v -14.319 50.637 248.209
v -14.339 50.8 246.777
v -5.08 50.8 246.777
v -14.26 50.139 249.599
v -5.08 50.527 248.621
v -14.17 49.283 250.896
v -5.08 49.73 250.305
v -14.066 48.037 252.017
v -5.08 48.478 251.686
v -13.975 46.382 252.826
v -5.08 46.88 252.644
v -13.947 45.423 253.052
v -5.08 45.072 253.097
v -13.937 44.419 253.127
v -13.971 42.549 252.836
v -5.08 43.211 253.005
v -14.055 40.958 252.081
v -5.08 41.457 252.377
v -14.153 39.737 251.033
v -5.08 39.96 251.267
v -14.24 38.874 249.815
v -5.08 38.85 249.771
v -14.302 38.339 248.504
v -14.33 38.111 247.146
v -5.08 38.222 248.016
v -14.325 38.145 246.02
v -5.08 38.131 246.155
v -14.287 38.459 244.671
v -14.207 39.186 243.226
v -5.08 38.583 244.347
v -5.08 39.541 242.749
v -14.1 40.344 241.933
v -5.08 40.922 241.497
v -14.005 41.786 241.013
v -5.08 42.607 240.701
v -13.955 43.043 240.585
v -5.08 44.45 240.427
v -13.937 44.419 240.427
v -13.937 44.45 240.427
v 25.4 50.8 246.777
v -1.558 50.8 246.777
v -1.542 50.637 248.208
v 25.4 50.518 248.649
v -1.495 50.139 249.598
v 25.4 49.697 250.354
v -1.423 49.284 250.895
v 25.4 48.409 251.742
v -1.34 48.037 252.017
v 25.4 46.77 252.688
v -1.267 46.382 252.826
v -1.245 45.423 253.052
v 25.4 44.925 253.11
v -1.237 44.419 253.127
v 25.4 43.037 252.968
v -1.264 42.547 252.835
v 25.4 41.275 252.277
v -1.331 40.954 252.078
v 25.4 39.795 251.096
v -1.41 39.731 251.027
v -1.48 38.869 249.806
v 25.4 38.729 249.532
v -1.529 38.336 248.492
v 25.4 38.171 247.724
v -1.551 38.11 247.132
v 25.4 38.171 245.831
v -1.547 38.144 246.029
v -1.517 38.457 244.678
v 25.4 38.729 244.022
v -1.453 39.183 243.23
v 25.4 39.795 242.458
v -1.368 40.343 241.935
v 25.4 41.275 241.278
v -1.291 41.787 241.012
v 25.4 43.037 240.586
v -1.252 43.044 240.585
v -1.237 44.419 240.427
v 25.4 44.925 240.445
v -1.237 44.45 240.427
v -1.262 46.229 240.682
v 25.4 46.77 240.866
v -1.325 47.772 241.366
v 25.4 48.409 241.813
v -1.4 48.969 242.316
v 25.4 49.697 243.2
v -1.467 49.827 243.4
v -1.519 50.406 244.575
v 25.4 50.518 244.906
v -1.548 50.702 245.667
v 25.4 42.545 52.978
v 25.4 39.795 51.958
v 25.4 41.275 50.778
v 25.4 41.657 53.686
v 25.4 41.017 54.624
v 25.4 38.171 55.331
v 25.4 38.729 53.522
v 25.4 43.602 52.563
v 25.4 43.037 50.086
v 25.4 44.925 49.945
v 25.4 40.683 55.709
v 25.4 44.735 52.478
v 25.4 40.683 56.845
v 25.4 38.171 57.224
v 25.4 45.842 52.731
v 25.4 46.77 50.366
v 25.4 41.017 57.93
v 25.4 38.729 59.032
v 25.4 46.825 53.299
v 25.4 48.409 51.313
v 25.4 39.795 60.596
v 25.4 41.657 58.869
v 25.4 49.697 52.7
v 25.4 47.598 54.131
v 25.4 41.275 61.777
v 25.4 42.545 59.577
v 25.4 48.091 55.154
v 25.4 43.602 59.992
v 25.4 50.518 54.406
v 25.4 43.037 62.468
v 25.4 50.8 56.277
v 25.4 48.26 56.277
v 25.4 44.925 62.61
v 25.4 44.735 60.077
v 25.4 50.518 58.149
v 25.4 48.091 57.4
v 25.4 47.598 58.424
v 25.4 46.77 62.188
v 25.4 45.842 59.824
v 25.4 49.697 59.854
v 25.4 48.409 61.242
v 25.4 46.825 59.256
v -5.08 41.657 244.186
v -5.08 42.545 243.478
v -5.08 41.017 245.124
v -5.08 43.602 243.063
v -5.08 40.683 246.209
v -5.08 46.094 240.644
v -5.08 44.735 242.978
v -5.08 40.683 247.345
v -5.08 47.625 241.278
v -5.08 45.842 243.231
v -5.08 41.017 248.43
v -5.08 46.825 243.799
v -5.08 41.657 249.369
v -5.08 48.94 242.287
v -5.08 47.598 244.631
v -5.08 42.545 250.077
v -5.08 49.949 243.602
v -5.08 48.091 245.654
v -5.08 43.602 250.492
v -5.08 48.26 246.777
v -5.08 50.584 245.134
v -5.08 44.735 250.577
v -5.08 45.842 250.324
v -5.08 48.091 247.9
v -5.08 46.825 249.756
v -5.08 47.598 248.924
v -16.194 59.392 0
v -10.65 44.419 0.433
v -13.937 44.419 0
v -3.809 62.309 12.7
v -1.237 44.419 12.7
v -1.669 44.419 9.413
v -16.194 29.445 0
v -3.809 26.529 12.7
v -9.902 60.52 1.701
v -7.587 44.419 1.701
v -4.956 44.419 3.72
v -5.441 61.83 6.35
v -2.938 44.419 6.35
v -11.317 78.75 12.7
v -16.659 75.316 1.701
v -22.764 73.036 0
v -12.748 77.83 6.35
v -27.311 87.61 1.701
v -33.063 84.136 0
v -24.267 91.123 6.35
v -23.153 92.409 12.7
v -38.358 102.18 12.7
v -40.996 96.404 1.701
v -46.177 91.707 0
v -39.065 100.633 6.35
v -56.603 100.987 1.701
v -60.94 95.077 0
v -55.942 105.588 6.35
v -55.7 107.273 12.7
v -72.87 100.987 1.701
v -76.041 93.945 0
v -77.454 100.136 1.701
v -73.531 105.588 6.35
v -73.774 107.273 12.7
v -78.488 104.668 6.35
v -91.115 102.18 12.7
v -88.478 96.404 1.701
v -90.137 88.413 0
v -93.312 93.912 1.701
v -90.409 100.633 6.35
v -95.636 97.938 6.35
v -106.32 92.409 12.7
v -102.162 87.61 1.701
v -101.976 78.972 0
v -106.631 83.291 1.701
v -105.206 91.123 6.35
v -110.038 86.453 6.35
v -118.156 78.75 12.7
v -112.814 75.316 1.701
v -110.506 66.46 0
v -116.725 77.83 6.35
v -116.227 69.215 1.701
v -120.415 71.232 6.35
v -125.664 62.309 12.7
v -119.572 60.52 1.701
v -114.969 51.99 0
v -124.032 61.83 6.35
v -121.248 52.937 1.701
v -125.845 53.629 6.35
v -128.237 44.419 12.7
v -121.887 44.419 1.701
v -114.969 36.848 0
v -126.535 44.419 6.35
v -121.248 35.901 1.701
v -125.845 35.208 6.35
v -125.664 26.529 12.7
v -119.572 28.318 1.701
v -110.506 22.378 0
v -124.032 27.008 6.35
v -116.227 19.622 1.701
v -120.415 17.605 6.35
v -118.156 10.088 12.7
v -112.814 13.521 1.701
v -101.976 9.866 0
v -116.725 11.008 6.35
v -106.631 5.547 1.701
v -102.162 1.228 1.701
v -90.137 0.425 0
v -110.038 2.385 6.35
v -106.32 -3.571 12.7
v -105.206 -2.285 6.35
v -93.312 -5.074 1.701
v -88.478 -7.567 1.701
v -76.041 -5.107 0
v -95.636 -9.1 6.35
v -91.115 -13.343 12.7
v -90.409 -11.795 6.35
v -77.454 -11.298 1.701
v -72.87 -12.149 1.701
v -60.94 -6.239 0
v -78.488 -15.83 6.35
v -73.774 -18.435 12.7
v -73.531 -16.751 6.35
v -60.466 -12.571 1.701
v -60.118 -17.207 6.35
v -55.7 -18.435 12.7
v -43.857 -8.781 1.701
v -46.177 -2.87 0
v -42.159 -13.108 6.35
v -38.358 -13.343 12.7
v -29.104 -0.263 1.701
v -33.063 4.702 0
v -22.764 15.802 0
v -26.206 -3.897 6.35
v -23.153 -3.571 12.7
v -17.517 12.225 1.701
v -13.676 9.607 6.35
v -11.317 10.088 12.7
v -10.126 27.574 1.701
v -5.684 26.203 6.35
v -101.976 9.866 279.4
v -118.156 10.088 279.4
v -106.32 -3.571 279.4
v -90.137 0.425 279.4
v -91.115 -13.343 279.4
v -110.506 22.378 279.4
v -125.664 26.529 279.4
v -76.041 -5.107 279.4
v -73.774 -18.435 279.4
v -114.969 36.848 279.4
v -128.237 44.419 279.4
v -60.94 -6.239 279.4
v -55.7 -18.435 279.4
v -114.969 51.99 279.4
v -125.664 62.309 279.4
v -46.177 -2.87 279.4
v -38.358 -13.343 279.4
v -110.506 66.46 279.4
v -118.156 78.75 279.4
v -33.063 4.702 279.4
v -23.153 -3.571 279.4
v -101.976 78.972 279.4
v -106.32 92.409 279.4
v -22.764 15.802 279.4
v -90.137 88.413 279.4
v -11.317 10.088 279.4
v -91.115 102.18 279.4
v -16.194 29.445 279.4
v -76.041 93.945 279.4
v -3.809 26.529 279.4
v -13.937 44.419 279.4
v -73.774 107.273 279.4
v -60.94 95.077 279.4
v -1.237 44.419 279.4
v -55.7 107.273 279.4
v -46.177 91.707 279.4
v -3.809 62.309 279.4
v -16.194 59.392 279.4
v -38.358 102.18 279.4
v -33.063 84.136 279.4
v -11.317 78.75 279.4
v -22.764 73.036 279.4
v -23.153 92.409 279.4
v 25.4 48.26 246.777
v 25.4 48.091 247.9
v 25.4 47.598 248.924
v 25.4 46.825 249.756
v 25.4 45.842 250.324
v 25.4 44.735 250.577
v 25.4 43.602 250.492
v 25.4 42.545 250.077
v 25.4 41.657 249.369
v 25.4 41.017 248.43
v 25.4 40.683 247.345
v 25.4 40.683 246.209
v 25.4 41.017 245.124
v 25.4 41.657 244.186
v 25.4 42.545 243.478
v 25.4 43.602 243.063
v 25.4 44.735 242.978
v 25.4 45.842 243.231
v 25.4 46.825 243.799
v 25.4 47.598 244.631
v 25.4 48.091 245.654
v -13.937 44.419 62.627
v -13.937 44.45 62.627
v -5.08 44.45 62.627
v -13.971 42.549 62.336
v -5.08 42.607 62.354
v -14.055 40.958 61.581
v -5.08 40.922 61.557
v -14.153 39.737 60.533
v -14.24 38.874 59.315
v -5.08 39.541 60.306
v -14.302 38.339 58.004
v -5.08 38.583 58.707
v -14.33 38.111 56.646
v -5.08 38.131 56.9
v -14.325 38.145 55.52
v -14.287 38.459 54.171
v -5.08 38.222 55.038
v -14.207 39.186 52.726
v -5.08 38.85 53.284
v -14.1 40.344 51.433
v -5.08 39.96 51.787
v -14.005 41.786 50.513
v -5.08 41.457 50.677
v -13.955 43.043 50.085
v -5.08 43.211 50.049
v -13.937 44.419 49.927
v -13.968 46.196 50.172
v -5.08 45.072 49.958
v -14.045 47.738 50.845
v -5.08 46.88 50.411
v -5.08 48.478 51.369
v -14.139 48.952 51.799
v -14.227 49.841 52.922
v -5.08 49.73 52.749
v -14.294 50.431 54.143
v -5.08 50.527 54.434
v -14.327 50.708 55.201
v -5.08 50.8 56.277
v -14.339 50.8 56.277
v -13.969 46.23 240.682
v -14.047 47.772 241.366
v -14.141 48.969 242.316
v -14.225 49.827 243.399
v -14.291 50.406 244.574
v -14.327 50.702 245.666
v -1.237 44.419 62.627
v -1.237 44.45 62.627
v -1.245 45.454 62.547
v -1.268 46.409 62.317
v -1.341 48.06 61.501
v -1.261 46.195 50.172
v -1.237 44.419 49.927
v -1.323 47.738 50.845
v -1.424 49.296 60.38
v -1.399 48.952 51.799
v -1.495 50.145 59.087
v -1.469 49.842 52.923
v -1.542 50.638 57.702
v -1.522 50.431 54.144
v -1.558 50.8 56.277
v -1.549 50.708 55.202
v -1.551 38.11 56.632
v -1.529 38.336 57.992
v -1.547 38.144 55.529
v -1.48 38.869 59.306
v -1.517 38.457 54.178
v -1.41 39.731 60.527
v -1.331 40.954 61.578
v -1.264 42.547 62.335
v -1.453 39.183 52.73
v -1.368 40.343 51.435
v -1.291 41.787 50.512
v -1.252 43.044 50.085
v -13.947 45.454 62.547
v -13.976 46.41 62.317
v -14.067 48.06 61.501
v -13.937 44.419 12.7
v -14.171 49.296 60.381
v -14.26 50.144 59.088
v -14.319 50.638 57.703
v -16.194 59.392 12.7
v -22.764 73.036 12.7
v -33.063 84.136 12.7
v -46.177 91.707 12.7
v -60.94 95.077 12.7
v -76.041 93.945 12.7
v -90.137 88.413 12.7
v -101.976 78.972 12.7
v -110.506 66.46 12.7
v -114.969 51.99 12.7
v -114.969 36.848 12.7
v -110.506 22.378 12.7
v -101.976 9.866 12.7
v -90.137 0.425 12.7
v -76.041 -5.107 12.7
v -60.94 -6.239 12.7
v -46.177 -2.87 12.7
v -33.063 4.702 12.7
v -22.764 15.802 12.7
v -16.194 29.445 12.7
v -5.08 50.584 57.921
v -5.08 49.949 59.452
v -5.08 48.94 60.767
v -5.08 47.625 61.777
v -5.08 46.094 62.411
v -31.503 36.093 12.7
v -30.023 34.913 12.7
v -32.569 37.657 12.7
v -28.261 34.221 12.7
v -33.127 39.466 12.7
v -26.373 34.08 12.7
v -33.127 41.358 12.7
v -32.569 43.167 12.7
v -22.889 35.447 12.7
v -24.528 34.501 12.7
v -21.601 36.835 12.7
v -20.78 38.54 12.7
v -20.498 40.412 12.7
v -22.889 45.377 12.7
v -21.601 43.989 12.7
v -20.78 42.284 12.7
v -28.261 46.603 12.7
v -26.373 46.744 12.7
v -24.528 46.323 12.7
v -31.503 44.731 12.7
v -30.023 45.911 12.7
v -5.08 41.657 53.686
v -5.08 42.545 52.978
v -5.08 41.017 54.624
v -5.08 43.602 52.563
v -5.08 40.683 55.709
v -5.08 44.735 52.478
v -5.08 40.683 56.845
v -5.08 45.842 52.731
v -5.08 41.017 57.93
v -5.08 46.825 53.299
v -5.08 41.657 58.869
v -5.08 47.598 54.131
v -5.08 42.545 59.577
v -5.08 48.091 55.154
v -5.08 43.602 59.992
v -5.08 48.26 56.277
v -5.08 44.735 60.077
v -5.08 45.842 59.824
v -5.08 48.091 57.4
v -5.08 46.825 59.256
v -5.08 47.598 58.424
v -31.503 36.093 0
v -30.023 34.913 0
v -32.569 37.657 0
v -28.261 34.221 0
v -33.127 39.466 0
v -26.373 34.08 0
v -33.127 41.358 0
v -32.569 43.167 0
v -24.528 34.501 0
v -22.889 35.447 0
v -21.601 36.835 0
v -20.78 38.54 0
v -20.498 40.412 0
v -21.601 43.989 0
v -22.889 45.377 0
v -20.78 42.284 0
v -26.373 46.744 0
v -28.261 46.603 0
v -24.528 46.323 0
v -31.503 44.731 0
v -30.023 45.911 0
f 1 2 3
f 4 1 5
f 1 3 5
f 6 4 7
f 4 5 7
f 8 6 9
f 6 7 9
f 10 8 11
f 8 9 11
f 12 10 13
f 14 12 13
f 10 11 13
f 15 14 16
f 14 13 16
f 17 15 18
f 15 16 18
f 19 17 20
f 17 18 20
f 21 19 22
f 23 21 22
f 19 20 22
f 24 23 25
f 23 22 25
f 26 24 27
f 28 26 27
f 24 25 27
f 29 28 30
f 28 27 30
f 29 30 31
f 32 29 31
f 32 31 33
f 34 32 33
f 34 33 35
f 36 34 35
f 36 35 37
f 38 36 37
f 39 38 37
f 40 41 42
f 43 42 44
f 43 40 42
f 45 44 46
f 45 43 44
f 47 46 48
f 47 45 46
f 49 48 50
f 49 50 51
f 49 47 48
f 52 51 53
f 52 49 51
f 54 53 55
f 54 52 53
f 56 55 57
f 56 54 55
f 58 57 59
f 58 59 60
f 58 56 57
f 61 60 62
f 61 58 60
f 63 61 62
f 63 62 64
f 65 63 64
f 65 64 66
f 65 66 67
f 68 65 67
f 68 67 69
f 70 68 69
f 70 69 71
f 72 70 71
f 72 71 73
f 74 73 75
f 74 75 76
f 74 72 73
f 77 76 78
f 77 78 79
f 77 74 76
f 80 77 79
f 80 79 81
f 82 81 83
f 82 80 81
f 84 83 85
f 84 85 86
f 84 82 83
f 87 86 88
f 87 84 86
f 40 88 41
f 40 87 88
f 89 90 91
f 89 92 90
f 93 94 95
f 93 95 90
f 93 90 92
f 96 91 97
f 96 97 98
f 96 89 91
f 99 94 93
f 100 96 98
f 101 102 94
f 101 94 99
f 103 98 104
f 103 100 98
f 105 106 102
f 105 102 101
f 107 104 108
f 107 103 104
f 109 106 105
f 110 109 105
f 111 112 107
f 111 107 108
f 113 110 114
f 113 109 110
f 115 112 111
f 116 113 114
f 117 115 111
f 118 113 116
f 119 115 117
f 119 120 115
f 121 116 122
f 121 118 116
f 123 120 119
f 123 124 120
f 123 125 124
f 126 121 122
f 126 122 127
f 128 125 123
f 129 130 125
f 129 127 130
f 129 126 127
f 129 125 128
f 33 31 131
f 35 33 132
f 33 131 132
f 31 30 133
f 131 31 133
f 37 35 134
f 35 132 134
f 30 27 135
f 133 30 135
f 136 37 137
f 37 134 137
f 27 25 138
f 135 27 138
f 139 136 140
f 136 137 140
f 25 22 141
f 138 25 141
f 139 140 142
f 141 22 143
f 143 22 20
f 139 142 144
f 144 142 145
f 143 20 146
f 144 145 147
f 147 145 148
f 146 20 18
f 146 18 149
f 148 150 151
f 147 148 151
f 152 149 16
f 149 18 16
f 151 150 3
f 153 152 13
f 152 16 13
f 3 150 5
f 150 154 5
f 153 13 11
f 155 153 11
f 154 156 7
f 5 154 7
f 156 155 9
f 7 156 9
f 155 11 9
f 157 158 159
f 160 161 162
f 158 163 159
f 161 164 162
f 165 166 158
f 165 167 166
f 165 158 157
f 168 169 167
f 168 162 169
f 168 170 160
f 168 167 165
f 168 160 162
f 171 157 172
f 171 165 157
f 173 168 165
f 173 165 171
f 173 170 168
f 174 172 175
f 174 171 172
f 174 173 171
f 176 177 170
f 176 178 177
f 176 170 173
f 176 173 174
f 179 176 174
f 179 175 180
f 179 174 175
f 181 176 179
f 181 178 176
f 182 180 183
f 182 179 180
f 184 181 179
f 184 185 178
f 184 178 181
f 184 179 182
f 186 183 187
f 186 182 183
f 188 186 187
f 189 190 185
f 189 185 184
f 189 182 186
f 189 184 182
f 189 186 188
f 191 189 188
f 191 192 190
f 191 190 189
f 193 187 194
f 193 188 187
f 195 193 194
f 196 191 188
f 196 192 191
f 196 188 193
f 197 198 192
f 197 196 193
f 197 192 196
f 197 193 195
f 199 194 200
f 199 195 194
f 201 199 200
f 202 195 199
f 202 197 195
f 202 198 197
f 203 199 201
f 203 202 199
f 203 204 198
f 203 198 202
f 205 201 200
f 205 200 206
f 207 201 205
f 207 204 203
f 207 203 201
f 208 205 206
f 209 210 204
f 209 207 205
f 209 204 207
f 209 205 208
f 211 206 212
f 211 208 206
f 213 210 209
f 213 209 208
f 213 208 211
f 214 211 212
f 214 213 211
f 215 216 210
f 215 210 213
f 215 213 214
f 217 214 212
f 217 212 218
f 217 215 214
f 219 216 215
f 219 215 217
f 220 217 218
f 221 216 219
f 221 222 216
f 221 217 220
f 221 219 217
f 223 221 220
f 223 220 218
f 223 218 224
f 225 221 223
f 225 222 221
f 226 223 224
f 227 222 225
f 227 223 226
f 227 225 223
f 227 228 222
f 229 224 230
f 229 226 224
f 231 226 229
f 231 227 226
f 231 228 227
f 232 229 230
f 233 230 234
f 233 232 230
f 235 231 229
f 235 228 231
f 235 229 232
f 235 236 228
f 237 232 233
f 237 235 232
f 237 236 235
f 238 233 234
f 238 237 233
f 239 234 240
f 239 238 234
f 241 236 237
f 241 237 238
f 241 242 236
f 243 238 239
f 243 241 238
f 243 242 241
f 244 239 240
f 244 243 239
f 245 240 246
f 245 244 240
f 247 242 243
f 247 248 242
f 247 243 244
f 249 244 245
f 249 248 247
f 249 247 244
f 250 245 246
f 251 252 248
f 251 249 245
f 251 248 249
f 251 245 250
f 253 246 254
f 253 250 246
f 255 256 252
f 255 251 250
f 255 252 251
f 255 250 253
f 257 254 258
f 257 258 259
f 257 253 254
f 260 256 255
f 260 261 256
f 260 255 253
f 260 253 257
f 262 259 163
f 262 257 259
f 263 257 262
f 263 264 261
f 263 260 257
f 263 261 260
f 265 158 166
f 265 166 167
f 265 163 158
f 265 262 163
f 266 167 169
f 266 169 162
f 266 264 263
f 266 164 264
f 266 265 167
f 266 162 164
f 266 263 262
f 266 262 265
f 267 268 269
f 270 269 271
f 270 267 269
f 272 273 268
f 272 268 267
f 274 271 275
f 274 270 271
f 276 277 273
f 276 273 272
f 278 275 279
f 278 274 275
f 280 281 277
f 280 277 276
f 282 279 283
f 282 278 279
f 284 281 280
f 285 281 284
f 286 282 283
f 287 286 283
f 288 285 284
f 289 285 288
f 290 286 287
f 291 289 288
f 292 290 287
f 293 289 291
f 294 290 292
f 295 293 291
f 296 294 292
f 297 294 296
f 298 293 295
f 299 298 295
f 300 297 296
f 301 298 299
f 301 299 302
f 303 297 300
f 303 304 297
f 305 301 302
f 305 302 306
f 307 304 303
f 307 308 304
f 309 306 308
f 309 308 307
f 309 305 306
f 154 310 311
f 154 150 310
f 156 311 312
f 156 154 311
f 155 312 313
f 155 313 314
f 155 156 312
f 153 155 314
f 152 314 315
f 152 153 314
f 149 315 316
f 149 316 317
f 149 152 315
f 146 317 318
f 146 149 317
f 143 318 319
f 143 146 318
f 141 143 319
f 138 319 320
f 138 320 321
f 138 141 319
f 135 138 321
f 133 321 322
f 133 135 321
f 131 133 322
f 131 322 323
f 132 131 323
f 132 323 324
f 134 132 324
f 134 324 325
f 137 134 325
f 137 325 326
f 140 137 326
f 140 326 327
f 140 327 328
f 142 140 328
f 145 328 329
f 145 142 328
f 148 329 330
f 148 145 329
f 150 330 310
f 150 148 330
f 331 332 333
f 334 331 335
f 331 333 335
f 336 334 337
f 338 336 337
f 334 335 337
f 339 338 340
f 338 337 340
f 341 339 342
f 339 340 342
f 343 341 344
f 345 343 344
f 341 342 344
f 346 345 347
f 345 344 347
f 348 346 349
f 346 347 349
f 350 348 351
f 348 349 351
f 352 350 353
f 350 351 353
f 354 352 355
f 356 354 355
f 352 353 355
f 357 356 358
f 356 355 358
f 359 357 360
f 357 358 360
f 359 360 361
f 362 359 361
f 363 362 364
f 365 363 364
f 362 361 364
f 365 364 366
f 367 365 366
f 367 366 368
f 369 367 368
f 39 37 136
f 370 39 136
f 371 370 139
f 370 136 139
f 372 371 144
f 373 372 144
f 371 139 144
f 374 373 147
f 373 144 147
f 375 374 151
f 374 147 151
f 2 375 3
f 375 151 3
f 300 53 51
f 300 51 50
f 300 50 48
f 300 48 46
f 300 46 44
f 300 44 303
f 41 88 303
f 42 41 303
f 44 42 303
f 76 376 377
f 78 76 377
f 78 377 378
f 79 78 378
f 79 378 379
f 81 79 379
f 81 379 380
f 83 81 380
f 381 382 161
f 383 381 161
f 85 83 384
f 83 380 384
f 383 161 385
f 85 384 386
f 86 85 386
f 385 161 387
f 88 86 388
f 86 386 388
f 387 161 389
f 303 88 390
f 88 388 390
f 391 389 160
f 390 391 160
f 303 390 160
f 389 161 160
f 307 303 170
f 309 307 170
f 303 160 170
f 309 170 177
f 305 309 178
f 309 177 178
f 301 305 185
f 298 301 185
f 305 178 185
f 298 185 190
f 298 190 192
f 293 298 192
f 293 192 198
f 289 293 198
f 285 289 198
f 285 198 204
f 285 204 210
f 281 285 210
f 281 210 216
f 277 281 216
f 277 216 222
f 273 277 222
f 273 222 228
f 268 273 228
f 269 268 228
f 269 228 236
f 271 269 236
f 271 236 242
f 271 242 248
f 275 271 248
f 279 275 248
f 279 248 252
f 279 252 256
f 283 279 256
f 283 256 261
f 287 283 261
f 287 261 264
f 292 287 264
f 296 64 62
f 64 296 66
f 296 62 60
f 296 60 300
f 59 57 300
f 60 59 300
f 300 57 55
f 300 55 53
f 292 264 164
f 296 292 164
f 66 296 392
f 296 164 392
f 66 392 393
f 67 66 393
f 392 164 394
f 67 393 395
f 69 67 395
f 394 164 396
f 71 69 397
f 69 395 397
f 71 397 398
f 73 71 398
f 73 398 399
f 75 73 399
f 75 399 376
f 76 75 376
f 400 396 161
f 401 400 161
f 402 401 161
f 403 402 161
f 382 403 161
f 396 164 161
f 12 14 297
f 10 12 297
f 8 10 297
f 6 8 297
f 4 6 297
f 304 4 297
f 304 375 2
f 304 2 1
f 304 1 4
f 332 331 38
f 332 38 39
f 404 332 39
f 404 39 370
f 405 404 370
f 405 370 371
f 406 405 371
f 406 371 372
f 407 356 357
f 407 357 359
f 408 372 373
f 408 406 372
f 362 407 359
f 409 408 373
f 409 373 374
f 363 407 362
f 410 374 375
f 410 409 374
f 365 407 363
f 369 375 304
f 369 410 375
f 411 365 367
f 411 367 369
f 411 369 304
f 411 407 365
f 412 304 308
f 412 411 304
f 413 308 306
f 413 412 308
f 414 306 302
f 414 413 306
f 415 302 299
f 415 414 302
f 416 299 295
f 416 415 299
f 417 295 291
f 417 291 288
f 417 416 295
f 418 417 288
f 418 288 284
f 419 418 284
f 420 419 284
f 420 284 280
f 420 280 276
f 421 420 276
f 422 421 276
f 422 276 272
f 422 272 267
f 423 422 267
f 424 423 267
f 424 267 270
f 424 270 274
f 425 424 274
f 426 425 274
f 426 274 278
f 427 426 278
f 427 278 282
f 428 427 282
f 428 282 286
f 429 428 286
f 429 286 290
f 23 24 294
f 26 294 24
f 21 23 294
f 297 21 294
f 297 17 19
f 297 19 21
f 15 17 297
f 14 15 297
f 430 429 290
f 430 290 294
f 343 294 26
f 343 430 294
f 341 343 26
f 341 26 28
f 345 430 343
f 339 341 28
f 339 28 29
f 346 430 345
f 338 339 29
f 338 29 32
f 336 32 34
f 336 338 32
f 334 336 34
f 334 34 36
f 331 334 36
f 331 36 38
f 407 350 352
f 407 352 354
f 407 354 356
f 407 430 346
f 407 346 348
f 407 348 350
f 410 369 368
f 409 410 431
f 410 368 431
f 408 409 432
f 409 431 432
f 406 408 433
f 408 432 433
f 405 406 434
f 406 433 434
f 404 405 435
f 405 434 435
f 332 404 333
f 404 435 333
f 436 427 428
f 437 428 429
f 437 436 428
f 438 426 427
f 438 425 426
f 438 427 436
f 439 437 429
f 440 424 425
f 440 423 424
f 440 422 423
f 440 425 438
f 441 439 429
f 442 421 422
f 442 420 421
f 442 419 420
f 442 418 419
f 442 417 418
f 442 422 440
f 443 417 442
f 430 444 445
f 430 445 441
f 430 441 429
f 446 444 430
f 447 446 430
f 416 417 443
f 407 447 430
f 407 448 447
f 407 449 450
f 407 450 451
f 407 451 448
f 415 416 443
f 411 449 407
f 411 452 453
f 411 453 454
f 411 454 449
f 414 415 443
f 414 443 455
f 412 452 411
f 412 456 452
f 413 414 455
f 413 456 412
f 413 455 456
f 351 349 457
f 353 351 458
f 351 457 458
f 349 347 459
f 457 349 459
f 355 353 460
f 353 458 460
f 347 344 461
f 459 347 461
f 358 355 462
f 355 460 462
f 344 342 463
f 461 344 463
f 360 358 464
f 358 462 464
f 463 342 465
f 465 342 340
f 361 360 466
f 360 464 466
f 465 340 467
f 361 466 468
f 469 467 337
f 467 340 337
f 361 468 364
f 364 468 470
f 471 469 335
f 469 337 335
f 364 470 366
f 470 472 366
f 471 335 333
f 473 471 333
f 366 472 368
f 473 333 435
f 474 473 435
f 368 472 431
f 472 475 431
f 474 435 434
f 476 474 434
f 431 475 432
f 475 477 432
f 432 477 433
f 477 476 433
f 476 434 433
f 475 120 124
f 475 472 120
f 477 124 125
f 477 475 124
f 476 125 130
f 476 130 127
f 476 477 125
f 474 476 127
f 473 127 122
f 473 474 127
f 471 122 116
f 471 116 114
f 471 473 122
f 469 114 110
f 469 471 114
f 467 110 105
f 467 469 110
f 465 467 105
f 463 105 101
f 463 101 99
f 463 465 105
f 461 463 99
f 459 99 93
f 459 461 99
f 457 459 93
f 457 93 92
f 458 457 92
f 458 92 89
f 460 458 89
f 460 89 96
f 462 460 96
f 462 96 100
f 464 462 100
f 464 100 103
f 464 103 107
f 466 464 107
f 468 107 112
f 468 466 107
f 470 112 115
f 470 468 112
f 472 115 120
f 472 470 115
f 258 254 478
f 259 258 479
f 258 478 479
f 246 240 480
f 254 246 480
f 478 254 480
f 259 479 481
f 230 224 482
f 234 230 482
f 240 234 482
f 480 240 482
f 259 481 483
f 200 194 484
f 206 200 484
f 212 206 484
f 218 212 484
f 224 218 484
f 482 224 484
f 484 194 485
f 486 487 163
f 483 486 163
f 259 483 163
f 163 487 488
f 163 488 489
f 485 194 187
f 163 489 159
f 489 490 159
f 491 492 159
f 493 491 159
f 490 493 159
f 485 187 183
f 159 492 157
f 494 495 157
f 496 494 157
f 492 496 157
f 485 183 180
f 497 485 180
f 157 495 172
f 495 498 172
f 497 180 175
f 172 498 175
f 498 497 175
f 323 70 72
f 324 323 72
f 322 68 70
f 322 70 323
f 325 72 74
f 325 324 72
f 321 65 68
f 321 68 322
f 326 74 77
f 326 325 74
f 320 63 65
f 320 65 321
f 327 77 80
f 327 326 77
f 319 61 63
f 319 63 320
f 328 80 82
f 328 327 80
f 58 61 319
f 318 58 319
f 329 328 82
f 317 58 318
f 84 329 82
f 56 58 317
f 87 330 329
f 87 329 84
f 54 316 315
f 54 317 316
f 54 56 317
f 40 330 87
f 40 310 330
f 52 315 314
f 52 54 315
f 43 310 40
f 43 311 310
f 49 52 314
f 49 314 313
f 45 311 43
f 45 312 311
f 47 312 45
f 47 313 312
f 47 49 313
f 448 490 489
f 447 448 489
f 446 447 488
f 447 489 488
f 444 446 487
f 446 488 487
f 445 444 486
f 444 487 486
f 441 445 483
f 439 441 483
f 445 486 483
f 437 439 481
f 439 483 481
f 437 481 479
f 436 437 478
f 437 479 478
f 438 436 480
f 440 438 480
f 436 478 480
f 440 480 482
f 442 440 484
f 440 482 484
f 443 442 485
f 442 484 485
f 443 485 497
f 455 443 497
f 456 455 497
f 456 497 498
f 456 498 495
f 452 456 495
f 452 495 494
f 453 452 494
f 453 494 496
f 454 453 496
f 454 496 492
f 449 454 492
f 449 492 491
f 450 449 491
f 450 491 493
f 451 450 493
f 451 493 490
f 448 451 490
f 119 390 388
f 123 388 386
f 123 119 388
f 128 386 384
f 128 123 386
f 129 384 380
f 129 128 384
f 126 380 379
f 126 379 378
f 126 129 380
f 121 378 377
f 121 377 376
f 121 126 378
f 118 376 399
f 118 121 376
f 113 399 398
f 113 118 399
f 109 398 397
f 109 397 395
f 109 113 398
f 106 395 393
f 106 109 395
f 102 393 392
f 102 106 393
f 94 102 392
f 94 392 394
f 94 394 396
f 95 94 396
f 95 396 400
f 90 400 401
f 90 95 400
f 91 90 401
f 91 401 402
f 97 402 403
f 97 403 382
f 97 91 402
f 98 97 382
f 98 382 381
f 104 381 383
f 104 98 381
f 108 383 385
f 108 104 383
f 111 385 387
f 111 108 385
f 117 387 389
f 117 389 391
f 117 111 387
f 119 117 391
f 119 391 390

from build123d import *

# Parameters (mm, degrees)
F0_R          = 63.5
F1_DEPTH      = 279.4
F2_T          = -12.7
F3_R          = 6.35
F4_DEPTH      = 279.401
F6_DEPTH      = 50.8
F7_R          = 6.35
F7_R_2        = 3.81
F8_DEPTH      = 25.4
F8_DEPTH_BACK = 5.08
F9_R          = 12.7


with BuildPart() as f1:
    # F0 (on Top) → F1 (new body)
    with BuildSketch(Plane.XY):
        with Locations((-64.736634, 44.41886)):
            Circle(F0_R)
    extrude(amount=F1_DEPTH)

    # F2
    f2_openings = [f1.faces().sort_by_distance(p)[0] for p in [
        (-64.736634, 44.41886, 279.4),
    ]]
    offset(amount=F2_T, openings=f2_openings)

    # F3 (on face) → F4 (cut, through all)
    with BuildSketch(Plane(origin=(0, 0, 0), x_dir=(1, 0, 0), z_dir=(0, 0, -1))):
        with Locations((-26.847913, -40.412018)):
            Circle(F3_R)
    extrude(amount=-F4_DEPTH, mode=Mode.SUBTRACT)

    # F5 (on Right) → F6 (cut)
    with BuildSketch(Plane.YZ):
        with BuildLine():
            ThreePointArc((44.45, 62.627283), (39.959872, 51.787155), (50.8, 56.277283))
            ThreePointArc((50.8, 56.277283), (48.940128, 60.767411), (44.45, 62.627283))
        make_face()
        with BuildLine():
            ThreePointArc((50.8, 246.777283), (39.959872, 251.267411), (44.45, 240.427283))
            ThreePointArc((44.45, 240.427283), (48.940128, 242.287155), (50.8, 246.777283))
        make_face()
    extrude(amount=-F6_DEPTH, mode=Mode.SUBTRACT)

    # F7 (on Right) → F8 (join, two sides)
    with BuildSketch(Plane.YZ) as f8_sk:
        with Locations((44.45, 246.777283)):
            Circle(F7_R)
        with Locations((44.45, 246.777283)):
            Circle(F7_R_2, mode=Mode.SUBTRACT)
        with Locations((44.45, 56.277283)):
            Circle(F7_R)
        with Locations((44.45, 56.277283)):
            Circle(F7_R_2, mode=Mode.SUBTRACT)
    extrude(amount=F8_DEPTH)
    extrude(f8_sk.sketch, amount=-F8_DEPTH_BACK)

    # F9
    f9_edges = [f1.edges().sort_by_distance(p)[0] for p in [
        (-128.236634, 44.41886, 0),
    ]]
    fillet(f9_edges, radius=F9_R)


solid = f1.part
